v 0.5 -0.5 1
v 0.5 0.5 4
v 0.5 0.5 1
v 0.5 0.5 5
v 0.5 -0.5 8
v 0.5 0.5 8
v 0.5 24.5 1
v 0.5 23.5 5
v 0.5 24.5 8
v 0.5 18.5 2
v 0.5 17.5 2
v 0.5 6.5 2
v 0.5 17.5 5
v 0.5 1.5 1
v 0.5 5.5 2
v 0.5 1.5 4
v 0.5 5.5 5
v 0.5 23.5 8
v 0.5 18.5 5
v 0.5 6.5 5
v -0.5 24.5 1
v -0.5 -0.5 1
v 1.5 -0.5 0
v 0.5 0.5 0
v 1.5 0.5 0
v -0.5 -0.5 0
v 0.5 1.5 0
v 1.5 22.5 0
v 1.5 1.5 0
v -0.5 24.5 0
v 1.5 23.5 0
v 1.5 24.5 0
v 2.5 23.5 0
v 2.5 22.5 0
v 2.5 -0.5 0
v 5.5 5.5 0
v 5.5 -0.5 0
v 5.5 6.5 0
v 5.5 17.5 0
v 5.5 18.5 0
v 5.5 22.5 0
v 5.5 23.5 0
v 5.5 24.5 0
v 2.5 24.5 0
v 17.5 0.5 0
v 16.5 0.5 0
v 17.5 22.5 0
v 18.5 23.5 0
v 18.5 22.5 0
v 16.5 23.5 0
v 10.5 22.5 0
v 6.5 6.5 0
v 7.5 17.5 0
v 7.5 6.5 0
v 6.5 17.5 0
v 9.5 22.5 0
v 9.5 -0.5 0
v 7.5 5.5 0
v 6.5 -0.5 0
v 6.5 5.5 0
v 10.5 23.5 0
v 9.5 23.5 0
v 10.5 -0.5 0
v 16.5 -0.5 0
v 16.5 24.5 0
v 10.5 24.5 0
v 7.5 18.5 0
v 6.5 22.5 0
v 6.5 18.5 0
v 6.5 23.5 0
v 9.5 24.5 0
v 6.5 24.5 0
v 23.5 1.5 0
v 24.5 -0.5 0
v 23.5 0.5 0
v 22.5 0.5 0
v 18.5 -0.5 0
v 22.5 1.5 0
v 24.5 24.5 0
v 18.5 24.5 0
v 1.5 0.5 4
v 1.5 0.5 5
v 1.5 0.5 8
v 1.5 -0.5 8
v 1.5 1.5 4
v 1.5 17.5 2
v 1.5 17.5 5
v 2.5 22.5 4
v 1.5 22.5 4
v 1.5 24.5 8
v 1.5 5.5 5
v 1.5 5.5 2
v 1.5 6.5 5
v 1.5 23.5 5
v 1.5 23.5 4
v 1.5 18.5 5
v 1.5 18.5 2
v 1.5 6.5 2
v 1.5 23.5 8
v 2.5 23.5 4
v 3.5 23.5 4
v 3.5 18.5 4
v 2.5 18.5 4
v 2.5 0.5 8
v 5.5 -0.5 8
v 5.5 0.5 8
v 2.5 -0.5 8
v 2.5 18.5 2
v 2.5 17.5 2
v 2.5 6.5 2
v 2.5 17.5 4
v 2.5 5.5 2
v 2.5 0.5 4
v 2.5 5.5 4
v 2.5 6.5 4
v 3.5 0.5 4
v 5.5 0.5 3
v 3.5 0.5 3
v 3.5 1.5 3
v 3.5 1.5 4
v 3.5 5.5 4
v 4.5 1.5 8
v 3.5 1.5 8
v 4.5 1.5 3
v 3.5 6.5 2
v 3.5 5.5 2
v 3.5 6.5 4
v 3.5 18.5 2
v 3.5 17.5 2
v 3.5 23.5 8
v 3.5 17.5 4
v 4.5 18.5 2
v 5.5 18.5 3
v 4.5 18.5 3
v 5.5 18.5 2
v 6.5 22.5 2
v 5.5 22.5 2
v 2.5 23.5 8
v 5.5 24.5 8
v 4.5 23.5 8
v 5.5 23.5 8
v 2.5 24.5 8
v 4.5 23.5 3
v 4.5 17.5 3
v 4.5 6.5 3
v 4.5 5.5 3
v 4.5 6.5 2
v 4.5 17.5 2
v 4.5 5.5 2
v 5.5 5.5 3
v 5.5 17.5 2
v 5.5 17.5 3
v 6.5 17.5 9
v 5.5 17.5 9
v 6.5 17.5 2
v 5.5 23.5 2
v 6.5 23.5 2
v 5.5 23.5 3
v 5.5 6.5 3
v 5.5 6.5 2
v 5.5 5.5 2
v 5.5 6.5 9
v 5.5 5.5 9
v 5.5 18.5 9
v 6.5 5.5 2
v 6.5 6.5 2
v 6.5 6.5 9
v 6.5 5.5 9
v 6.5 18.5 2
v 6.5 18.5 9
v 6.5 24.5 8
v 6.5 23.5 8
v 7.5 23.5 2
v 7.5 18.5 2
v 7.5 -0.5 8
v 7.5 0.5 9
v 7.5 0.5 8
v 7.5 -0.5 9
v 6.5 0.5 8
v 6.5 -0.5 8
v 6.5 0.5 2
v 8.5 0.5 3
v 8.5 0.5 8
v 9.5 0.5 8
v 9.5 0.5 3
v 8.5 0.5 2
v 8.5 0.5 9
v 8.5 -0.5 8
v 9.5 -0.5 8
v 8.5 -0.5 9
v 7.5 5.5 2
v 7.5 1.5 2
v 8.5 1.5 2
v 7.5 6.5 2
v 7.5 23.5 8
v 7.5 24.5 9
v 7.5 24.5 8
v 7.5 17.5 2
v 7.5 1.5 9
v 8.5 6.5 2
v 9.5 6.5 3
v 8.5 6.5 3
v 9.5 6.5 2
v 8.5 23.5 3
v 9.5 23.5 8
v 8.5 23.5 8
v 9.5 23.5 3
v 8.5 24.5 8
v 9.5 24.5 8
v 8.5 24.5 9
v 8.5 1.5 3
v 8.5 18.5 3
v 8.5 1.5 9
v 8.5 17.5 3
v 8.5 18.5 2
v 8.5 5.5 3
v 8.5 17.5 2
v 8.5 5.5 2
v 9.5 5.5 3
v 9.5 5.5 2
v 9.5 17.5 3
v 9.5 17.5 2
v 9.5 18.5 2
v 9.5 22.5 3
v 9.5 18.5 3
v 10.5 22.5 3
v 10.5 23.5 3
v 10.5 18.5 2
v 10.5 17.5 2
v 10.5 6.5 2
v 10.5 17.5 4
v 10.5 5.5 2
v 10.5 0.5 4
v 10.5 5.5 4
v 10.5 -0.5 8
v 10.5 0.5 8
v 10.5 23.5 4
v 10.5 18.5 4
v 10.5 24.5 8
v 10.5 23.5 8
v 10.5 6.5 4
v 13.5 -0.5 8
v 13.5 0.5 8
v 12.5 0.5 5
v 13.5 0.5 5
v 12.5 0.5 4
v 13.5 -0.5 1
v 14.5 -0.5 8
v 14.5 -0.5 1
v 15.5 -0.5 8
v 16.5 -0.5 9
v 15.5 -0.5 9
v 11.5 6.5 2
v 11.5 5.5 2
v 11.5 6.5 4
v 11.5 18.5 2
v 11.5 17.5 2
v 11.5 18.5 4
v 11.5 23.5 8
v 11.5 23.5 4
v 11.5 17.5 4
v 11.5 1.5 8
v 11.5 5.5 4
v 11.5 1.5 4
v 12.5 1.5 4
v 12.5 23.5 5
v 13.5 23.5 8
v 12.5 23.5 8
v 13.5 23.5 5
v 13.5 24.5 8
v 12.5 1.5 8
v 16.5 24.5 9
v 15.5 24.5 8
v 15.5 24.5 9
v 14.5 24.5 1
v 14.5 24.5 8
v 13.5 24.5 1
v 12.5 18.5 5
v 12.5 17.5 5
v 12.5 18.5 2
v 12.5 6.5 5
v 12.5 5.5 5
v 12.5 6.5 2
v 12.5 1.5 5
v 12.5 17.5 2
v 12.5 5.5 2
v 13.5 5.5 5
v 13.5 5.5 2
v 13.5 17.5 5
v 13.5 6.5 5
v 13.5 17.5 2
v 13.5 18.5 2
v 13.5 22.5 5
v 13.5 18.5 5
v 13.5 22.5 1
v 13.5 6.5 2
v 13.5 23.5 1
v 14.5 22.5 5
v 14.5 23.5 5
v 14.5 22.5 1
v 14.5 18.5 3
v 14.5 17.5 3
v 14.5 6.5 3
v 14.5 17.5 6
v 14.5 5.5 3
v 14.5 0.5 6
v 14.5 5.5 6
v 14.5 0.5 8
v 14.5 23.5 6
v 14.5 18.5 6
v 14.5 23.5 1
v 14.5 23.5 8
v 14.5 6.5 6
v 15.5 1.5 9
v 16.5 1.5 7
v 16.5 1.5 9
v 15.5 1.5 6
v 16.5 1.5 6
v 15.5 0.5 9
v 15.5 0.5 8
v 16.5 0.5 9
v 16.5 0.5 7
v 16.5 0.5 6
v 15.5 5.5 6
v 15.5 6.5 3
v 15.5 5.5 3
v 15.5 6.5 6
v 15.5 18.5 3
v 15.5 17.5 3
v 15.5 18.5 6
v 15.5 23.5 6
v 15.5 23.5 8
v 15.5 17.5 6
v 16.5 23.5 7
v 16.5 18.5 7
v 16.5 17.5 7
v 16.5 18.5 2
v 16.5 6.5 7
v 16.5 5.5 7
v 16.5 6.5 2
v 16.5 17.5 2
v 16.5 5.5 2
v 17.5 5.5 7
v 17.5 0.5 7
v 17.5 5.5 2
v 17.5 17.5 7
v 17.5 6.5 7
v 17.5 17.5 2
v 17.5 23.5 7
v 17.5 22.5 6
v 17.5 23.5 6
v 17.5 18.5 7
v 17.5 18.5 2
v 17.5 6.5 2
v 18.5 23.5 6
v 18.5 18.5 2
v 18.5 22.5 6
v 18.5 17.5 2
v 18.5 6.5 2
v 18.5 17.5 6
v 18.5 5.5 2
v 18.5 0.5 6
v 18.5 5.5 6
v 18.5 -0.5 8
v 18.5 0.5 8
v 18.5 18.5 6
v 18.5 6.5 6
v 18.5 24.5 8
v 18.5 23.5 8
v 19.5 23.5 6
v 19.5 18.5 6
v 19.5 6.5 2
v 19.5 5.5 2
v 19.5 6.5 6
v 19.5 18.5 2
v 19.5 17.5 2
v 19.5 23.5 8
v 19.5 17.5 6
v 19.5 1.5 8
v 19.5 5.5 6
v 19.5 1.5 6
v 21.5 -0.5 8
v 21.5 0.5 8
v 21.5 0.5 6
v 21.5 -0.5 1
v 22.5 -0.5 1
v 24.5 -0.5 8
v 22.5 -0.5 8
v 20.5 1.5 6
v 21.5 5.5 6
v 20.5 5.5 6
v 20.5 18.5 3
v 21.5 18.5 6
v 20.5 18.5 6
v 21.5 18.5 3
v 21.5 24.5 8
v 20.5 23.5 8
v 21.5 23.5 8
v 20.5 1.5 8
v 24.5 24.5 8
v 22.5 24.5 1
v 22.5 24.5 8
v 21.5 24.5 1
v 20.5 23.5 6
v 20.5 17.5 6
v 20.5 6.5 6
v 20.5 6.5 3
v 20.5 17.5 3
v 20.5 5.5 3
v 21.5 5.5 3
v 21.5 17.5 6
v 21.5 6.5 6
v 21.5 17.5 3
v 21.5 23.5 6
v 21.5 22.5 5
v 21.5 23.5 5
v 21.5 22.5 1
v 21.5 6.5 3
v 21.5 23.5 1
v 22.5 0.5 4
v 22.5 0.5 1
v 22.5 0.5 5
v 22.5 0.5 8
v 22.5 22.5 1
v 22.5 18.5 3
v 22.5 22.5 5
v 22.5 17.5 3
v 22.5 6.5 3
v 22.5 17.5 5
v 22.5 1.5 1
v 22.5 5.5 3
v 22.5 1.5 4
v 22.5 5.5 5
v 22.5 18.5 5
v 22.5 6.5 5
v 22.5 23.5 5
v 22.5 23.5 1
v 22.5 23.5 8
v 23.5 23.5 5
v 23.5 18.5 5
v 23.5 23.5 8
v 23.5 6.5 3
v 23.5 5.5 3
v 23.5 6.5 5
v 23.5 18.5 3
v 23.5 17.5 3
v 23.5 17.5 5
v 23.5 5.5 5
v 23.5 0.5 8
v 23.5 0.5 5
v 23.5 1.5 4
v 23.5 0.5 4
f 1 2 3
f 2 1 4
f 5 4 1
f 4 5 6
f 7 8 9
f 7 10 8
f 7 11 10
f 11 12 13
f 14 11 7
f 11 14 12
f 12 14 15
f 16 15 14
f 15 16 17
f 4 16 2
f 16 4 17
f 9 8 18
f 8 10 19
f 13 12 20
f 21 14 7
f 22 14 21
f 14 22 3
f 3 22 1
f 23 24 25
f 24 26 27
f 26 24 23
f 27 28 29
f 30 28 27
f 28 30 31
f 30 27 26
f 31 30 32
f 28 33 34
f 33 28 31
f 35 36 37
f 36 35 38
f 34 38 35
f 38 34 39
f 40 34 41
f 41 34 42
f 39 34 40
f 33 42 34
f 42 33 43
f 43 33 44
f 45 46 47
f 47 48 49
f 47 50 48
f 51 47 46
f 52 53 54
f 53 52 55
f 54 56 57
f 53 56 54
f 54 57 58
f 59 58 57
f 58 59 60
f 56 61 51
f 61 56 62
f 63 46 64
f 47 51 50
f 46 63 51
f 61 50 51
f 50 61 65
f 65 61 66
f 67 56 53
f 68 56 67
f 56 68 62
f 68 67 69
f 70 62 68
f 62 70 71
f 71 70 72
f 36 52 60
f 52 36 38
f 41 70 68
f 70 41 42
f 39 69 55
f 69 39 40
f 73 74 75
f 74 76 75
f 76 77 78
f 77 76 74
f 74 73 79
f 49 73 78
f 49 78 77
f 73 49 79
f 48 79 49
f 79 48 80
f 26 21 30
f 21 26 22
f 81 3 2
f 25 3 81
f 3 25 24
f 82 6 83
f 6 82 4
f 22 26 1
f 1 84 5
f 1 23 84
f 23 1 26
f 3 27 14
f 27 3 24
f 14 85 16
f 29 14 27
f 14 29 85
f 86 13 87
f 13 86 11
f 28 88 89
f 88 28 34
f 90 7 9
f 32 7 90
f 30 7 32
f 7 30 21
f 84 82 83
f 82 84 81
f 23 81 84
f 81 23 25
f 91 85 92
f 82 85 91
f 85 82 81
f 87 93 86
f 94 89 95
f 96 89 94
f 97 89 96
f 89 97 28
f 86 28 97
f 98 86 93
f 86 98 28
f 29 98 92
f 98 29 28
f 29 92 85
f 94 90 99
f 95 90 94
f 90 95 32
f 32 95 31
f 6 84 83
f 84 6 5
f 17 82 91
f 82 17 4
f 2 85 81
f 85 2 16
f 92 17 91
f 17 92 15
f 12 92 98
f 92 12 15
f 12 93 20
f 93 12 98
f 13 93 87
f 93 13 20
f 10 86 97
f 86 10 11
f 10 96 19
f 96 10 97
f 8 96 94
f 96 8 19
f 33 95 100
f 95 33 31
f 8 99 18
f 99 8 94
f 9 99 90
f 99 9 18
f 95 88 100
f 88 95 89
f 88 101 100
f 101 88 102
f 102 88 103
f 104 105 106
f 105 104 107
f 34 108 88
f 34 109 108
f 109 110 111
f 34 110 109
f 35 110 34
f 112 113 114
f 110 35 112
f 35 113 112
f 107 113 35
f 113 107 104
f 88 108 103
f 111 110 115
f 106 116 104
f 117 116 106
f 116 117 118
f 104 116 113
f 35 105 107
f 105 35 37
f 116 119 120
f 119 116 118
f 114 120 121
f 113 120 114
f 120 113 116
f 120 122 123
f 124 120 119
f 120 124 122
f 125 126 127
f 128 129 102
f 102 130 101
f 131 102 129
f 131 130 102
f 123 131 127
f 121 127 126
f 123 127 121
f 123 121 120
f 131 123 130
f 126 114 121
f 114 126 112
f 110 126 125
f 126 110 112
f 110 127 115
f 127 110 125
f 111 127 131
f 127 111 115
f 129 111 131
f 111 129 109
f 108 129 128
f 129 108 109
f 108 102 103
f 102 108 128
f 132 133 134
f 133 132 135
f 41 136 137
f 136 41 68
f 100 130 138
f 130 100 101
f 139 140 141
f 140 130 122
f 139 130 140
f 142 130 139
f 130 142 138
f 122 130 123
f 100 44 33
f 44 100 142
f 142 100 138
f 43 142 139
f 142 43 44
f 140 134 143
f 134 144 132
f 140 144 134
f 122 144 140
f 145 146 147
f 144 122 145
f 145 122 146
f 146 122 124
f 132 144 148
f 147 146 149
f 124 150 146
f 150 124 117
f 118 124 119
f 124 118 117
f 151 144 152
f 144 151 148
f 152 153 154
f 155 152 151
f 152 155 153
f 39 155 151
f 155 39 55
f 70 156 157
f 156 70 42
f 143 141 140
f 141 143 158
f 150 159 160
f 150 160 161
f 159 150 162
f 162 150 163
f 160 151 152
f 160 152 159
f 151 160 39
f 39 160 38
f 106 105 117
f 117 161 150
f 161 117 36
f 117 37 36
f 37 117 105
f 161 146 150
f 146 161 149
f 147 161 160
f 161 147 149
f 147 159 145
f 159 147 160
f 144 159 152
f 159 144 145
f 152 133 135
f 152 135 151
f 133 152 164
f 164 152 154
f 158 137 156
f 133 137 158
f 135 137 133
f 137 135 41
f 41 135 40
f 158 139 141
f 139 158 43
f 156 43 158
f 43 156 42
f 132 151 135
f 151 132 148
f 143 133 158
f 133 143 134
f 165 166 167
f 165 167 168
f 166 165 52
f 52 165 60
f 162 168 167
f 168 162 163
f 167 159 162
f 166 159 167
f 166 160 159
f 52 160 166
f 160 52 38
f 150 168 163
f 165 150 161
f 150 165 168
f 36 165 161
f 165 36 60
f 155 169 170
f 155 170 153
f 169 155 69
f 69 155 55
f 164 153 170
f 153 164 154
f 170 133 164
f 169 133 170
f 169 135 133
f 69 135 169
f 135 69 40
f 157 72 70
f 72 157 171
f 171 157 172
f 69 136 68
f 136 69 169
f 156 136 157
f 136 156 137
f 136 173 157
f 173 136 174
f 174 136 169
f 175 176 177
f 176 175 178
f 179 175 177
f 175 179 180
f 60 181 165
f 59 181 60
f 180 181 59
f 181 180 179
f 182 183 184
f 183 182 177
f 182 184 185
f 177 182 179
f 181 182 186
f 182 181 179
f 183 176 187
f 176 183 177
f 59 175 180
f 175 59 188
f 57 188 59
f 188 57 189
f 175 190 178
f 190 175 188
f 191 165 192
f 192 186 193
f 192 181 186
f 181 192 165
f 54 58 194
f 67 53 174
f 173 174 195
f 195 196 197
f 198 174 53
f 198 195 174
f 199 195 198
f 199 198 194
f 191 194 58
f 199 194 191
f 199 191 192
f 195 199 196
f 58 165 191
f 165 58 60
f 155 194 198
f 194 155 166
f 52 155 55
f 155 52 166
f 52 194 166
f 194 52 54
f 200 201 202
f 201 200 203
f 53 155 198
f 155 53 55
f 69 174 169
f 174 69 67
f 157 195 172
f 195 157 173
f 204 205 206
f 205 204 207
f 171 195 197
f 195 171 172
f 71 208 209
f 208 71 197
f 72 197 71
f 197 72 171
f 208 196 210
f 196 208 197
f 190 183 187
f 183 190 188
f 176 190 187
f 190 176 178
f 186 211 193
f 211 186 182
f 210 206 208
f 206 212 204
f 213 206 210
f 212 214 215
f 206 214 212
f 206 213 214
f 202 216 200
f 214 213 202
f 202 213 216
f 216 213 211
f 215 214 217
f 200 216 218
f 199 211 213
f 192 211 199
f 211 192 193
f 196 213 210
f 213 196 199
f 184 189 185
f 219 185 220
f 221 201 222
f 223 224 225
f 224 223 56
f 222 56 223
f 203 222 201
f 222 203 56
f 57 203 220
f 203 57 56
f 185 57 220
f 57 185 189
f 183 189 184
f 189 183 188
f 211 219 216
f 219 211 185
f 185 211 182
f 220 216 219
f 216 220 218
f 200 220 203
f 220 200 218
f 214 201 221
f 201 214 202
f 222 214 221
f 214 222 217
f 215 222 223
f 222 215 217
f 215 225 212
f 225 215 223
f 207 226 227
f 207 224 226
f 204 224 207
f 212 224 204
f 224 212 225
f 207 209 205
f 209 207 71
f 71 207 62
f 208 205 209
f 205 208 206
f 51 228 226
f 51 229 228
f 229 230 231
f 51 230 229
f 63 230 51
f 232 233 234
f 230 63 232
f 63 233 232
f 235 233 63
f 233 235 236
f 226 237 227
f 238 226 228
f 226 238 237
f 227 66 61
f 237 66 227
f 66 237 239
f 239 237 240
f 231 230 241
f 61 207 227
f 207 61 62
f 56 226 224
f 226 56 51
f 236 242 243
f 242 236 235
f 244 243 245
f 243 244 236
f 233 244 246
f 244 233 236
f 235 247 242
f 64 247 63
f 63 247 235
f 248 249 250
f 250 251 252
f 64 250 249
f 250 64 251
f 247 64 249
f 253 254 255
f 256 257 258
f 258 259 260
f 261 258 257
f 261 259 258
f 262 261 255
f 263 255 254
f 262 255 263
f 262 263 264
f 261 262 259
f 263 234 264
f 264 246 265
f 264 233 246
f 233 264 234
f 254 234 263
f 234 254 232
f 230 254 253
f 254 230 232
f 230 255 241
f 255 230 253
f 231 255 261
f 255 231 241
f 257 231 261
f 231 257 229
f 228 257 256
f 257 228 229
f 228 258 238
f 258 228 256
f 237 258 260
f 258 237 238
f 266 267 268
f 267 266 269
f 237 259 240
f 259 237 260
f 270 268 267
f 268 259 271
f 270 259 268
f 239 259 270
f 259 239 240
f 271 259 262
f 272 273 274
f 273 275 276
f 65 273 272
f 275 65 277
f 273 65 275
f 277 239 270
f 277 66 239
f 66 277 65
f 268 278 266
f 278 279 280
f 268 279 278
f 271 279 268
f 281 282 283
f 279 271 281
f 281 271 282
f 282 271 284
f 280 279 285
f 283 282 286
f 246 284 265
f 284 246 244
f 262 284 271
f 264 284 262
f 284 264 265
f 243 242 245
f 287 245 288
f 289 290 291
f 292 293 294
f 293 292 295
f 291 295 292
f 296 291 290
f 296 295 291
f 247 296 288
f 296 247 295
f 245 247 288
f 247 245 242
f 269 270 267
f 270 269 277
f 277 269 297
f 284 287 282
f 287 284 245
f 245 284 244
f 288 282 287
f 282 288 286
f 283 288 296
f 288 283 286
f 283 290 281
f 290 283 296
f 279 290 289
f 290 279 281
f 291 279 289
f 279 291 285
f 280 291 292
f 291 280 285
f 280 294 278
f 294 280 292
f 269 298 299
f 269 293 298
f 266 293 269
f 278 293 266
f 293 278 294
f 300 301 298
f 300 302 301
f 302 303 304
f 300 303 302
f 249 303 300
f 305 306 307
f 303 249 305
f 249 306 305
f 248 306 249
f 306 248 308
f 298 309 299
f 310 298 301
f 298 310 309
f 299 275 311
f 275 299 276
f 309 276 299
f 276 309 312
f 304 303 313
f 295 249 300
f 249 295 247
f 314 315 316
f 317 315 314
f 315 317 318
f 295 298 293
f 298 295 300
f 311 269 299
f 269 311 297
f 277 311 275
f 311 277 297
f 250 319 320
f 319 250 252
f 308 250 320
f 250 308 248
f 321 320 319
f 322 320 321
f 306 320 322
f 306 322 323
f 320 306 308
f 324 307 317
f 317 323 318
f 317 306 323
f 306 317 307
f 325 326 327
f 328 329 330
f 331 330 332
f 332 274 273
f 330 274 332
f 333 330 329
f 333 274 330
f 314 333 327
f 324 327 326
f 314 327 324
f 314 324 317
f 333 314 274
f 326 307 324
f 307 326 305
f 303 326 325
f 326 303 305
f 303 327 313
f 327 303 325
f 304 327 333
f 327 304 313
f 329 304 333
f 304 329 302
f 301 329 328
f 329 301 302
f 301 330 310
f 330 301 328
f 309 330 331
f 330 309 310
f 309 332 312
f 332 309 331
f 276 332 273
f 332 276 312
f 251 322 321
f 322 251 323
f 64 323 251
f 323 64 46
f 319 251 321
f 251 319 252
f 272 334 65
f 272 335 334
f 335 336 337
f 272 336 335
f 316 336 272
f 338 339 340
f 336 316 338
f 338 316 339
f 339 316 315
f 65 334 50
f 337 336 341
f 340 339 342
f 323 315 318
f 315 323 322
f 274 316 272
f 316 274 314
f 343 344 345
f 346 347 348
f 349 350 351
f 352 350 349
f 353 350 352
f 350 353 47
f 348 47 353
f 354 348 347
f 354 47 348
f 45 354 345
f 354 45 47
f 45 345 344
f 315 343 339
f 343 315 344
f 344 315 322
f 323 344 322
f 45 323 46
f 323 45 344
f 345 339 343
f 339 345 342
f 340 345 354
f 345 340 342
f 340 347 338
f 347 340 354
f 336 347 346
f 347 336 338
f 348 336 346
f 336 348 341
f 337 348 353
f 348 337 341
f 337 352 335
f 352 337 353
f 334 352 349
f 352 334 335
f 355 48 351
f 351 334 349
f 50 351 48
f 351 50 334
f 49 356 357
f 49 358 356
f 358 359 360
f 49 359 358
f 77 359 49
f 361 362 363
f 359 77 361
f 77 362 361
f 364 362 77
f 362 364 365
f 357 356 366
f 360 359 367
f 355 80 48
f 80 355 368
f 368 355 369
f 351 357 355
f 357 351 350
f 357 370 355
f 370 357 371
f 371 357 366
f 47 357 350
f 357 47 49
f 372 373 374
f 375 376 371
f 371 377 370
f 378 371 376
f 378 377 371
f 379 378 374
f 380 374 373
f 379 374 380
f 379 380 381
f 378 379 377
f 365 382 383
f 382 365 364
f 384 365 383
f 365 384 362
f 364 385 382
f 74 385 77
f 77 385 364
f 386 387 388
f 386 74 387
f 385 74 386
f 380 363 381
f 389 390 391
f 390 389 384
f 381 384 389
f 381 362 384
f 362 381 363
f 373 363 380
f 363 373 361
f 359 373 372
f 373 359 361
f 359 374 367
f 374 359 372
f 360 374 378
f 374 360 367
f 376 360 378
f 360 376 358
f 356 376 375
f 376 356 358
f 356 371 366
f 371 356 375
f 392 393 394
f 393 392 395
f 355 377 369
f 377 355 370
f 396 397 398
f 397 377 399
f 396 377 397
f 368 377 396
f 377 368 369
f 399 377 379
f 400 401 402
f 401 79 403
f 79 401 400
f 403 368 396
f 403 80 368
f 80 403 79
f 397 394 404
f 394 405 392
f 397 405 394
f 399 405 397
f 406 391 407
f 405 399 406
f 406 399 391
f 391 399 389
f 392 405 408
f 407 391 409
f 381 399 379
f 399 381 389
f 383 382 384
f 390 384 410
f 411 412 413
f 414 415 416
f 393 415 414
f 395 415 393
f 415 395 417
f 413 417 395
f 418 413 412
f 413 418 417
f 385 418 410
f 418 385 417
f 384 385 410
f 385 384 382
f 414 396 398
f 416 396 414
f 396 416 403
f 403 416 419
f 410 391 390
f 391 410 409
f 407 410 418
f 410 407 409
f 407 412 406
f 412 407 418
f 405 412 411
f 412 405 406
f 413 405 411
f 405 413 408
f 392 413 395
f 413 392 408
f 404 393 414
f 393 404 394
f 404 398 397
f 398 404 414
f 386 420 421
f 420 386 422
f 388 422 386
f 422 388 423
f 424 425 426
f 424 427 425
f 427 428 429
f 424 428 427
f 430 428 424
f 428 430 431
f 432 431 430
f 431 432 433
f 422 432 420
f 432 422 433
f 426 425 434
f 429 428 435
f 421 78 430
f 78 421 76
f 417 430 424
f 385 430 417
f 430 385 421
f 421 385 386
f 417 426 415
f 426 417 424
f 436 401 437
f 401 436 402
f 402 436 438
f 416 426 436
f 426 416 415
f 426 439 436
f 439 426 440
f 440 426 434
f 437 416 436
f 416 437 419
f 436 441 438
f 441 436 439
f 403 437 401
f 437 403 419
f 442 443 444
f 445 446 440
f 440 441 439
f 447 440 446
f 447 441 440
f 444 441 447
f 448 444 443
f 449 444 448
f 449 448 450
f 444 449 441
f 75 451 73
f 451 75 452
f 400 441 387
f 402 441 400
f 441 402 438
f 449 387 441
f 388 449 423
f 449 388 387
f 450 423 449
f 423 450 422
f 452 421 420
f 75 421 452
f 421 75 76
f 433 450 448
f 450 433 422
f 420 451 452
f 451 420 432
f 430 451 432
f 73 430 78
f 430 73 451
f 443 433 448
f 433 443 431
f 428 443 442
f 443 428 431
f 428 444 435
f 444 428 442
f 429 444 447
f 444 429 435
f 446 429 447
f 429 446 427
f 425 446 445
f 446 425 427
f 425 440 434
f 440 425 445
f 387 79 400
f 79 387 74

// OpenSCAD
union() {
    translate([0, 0, 0.5]) cube([1, 1, 1], center=true);
    translate([0, 1, 0.5]) cube([1, 1, 1], center=true);
    translate([0, 2, 0.5]) cube([1, 1, 1], center=true);
    translate([0, 3, 0.5]) cube([1, 1, 1], center=true);
    translate([0, 4, 0.5]) cube([1, 1, 1], center=true);
    translate([0, 5, 0.5]) cube([1, 1, 1], center=true);
    translate([0, 6, 0.5]) cube([1, 1, 1], center=true);
    translate([0, 7, 0.5]) cube([1, 1, 1], center=true);
    translate([0, 8, 0.5]) cube([1, 1, 1], center=true);
    translate([0, 9, 0.5]) cube([1, 1, 1], center=true);
    translate([0, 10, 0.5]) cube([1, 1, 1], center=true);
    translate([0, 11, 0.5]) cube([1, 1, 1], center=true);
    translate([0, 12, 0.5]) cube([1, 1, 1], center=true);
    translate([0, 13, 0.5]) cube([1, 1, 1], center=true);
    translate([0, 14, 0.5]) cube([1, 1, 1], center=true);
    translate([0, 15, 0.5]) cube([1, 1, 1], center=true);
    translate([0, 16, 0.5]) cube([1, 1, 1], center=true);
    translate([0, 17, 0.5]) cube([1, 1, 1], center=true);
    translate([0, 18, 0.5]) cube([1, 1, 1], center=true);
    translate([0, 19, 0.5]) cube([1, 1, 1], center=true);
    translate([0, 20, 0.5]) cube([1, 1, 1], center=true);
    translate([0, 21, 0.5]) cube([1, 1, 1], center=true);
    translate([0, 22, 0.5]) cube([1, 1, 1], center=true);
    translate([0, 23, 0.5]) cube([1, 1, 1], center=true);
    translate([0, 24, 0.5]) cube([1, 1, 1], center=true);
    translate([1, 0, 4.0]) cube([1, 1, 8], center=true);
    translate([1, 1, 4.5]) color([1, 0, 0]) cube([1, 1, 1], center=true);
    translate([1, 2, 2.5]) cube([1, 1, 5], center=true);
    translate([1, 3, 2.5]) cube([1, 1, 5], center=true);
    translate([1, 4, 2.5]) cube([1, 1, 5], center=true);
    translate([1, 5, 2.5]) cube([1, 1, 5], center=true);
    translate([1, 6, 1.0]) cube([1, 1, 2], center=true);
    translate([1, 7, 2.5]) cube([1, 1, 5], center=true);
    translate([1, 8, 2.5]) cube([1, 1, 5], center=true);
    translate([1, 9, 2.5]) cube([1, 1, 5], center=true);
    translate([1, 10, 2.5]) cube([1, 1, 5], center=true);
    translate([1, 11, 2.5]) cube([1, 1, 5], center=true);
    translate([1, 12, 2.5]) cube([1, 1, 5], center=true);
    translate([1, 13, 2.5]) cube([1, 1, 5], center=true);
    translate([1, 14, 2.5]) cube([1, 1, 5], center=true);
    translate([1, 15, 2.5]) cube([1, 1, 5], center=true);
    translate([1, 16, 2.5]) cube([1, 1, 5], center=true);
    translate([1, 17, 2.5]) cube([1, 1, 5], center=true);
    translate([1, 18, 1.0]) cube([1, 1, 2], center=true);
    translate([1, 19, 2.5]) cube([1, 1, 5], center=true);
    translate([1, 20, 2.5]) cube([1, 1, 5], center=true);
    translate([1, 21, 2.5]) cube([1, 1, 5], center=true);
    translate([1, 22, 2.5]) cube([1, 1, 5], center=true);
    translate([1, 23, 2.5]) cube([1, 1, 5], center=true);
    translate([1, 24, 4.0]) cube([1, 1, 8], center=true);
    translate([2, 23, 2.0]) cube([1, 1, 4], center=true);
    translate([3, 0, 4.0]) cube([1, 1, 8], center=true);
    translate([3, 1, 2.0]) cube([1, 1, 4], center=true);
    translate([3, 2, 2.0]) cube([1, 1, 4], center=true);
    translate([3, 3, 2.0]) cube([1, 1, 4], center=true);
    translate([3, 4, 2.0]) cube([1, 1, 4], center=true);
    translate([3, 5, 2.0]) cube([1, 1, 4], center=true);
    translate([3, 6, 1.0]) cube([1, 1, 2], center=true);
    translate([3, 7, 2.0]) cube([1, 1, 4], center=true);
    translate([3, 8, 2.0]) cube([1, 1, 4], center=true);
    translate([3, 9, 2.0]) cube([1, 1, 4], center=true);
    translate([3, 10, 2.0]) cube([1, 1, 4], center=true);
    translate([3, 11, 2.0]) cube([1, 1, 4], center=true);
    translate([3, 12, 2.0]) cube([1, 1, 4], center=true);
    translate([3, 13, 2.0]) cube([1, 1, 4], center=true);
    translate([3, 14, 2.0]) cube([1, 1, 4], center=true);
    translate([3, 15, 2.0]) cube([1, 1, 4], center=true);
    translate([3, 16, 2.0]) cube([1, 1, 4], center=true);
    translate([3, 17, 2.0]) cube([1, 1, 4], center=true);
    translate([3, 18, 1.0]) cube([1, 1, 2], center=true);
    translate([3, 19, 2.0]) cube([1, 1, 4], center=true);
    translate([3, 20, 2.0]) cube([1, 1, 4], center=true);
    translate([3, 21, 2.0]) cube([1, 1, 4], center=true);
    translate([3, 22, 2.0]) cube([1, 1, 4], center=true);
    translate([3, 23, 2.0]) cube([1, 1, 4], center=true);
    translate([3, 24, 4.0]) cube([1, 1, 8], center=true);
    translate([4, 0, 4.0]) cube([1, 1, 8], center=true);
    translate([4, 1, 1.5]) cube([1, 1, 3], center=true);
    translate([4, 2, 4.0]) cube([1, 1, 8], center=true);
    translate([4, 3, 4.0]) cube([1, 1, 8], center=true);
    translate([4, 4, 4.0]) cube([1, 1, 8], center=true);
    translate([4, 5, 4.0]) cube([1, 1, 8], center=true);
    translate([4, 6, 4.0]) cube([1, 1, 8], center=true);
    translate([4, 7, 4.0]) cube([1, 1, 8], center=true);
    translate([4, 8, 4.0]) cube([1, 1, 8], center=true);
    translate([4, 9, 4.0]) cube([1, 1, 8], center=true);
    translate([4, 10, 4.0]) cube([1, 1, 8], center=true);
    translate([4, 11, 4.0]) cube([1, 1, 8], center=true);
    translate([4, 12, 4.0]) cube([1, 1, 8], center=true);
    translate([4, 13, 4.0]) cube([1, 1, 8], center=true);
    translate([4, 14, 4.0]) cube([1, 1, 8], center=true);
    translate([4, 15, 4.0]) cube([1, 1, 8], center=true);
    translate([4, 16, 4.0]) cube([1, 1, 8], center=true);
    translate([4, 17, 4.0]) cube([1, 1, 8], center=true);
    translate([4, 18, 4.0]) cube([1, 1, 8], center=true);
    translate([4, 19, 4.0]) cube([1, 1, 8], center=true);
    translate([4, 20, 4.0]) cube([1, 1, 8], center=true);
    translate([4, 21, 4.0]) cube([1, 1, 8], center=true);
    translate([4, 22, 4.0]) cube([1, 1, 8], center=true);
    translate([4, 23, 4.0]) cube([1, 1, 8], center=true);
    translate([4, 24, 4.0]) cube([1, 1, 8], center=true);
    translate([5, 0, 4.0]) cube([1, 1, 8], center=true);
    translate([5, 1, 1.5]) cube([1, 1, 3], center=true);
    translate([5, 2, 1.5]) cube([1, 1, 3], center=true);
    translate([5, 3, 1.5]) cube([1, 1, 3], center=true);
    translate([5, 4, 1.5]) cube([1, 1, 3], center=true);
    translate([5, 5, 1.5]) cube([1, 1, 3], center=true);
    translate([5, 6, 1.0]) cube([1, 1, 2], center=true);
    translate([5, 7, 1.5]) cube([1, 1, 3], center=true);
    translate([5, 8, 1.5]) cube([1, 1, 3], center=true);
    translate([5, 9, 1.5]) cube([1, 1, 3], center=true);
    translate([5, 10, 1.5]) cube([1, 1, 3], center=true);
    translate([5, 11, 1.5]) cube([1, 1, 3], center=true);
    translate([5, 12, 1.5]) cube([1, 1, 3], center=true);
    translate([5, 13, 1.5]) cube([1, 1, 3], center=true);
    translate([5, 14, 1.5]) cube([1, 1, 3], center=true);
    translate([5, 15, 1.5]) cube([1, 1, 3], center=true);
    translate([5, 16, 1.5]) cube([1, 1, 3], center=true);
    translate([5, 17, 1.5]) cube([1, 1, 3], center=true);
    translate([5, 18, 1.0]) cube([1, 1, 2], center=true);
    translate([5, 19, 1.5]) cube([1, 1, 3], center=true);
    translate([5, 20, 1.5]) cube([1, 1, 3], center=true);
    translate([5, 21, 1.5]) cube([1, 1, 3], center=true);
    translate([5, 22, 1.5]) cube([1, 1, 3], center=true);
    translate([5, 23, 1.5]) cube([1, 1, 3], center=true);
    translate([5, 24, 4.0]) cube([1, 1, 8], center=true);
    translate([6, 6, 4.5]) cube([1, 1, 9], center=true);
    translate([6, 18, 4.5]) cube([1, 1, 9], center=true);
    translate([6, 23, 1.0]) cube([1, 1, 2], center=true);
    translate([7, 0, 4.0]) cube([1, 1, 8], center=true);
    translate([7, 1, 1.0]) cube([1, 1, 2], center=true);
    translate([7, 2, 1.0]) cube([1, 1, 2], center=true);
    translate([7, 3, 1.0]) cube([1, 1, 2], center=true);
    translate([7, 4, 1.0]) cube([1, 1, 2], center=true);
    translate([7, 5, 1.0]) cube([1, 1, 2], center=true);
    translate([7, 7, 1.0]) cube([1, 1, 2], center=true);
    translate([7, 8, 1.0]) cube([1, 1, 2], center=true);
    translate([7, 9, 1.0]) cube([1, 1, 2], center=true);
    translate([7, 10, 1.0]) cube([1, 1, 2], center=true);
    translate([7, 11, 1.0]) cube([1, 1, 2], center=true);
    translate([7, 12, 1.0]) cube([1, 1, 2], center=true);
    translate([7, 13, 1.0]) cube([1, 1, 2], center=true);
    translate([7, 14, 1.0]) cube([1, 1, 2], center=true);
    translate([7, 15, 1.0]) cube([1, 1, 2], center=true);
    translate([7, 16, 1.0]) cube([1, 1, 2], center=true);
    translate([7, 17, 1.0]) cube([1, 1, 2], center=true);
    translate([7, 19, 1.0]) cube([1, 1, 2], center=true);
    translate([7, 20, 1.0]) cube([1, 1, 2], center=true);
    translate([7, 21, 1.0]) cube([1, 1, 2], center=true);
    translate([7, 22, 1.0]) cube([1, 1, 2], center=true);
    translate([7, 23, 1.0]) cube([1, 1, 2], center=true);
    translate([7, 24, 4.0]) cube([1, 1, 8], center=true);
    translate([8, 0, 4.5]) cube([1, 1, 9], center=true);
    translate([8, 1, 1.0]) cube([1, 1, 2], center=true);
    translate([8, 2, 4.5]) cube([1, 1, 9], center=true);
    translate([8, 3, 4.5]) cube([1, 1, 9], center=true);
    translate([8, 4, 4.5]) cube([1, 1, 9], center=true);
    translate([8, 5, 4.5]) cube([1, 1, 9], center=true);
    translate([8, 6, 4.5]) cube([1, 1, 9], center=true);
    translate([8, 7, 4.5]) cube([1, 1, 9], center=true);
    translate([8, 8, 4.5]) cube([1, 1, 9], center=true);
    translate([8, 9, 4.5]) cube([1, 1, 9], center=true);
    translate([8, 10, 4.5]) cube([1, 1, 9], center=true);
    translate([8, 11, 4.5]) cube([1, 1, 9], center=true);
    translate([8, 12, 4.5]) cube([1, 1, 9], center=true);
    translate([8, 13, 4.5]) cube([1, 1, 9], center=true);
    translate([8, 14, 4.5]) cube([1, 1, 9], center=true);
    translate([8, 15, 4.5]) cube([1, 1, 9], center=true);
    translate([8, 16, 4.5]) cube([1, 1, 9], center=true);
    translate([8, 17, 4.5]) cube([1, 1, 9], center=true);
    translate([8, 18, 4.5]) cube([1, 1, 9], center=true);
    translate([8, 19, 4.5]) cube([1, 1, 9], center=true);
    translate([8, 20, 4.5]) cube([1, 1, 9], center=true);
    translate([8, 21, 4.5]) cube([1, 1, 9], center=true);
    translate([8, 22, 4.5]) cube([1, 1, 9], center=true);
    translate([8, 23, 4.5]) cube([1, 1, 9], center=true);
    translate([8, 24, 4.5]) cube([1, 1, 9], center=true);
    translate([9, 0, 4.0]) cube([1, 1, 8], center=true);
    translate([9, 1, 1.5]) cube([1, 1, 3], center=true);
    translate([9, 2, 1.5]) cube([1, 1, 3], center=true);
    translate([9, 3, 1.5]) cube([1, 1, 3], center=true);
    translate([9, 4, 1.5]) cube([1, 1, 3], center=true);
    translate([9, 5, 1.5]) cube([1, 1, 3], center=true);
    translate([9, 6, 1.0]) cube([1, 1, 2], center=true);
    translate([9, 7, 1.5]) cube([1, 1, 3], center=true);
    translate([9, 8, 1.5]) cube([1, 1, 3], center=true);
    translate([9, 9, 1.5]) cube([1, 1, 3], center=true);
    translate([9, 10, 1.5]) cube([1, 1, 3], center=true);
    translate([9, 11, 1.5]) cube([1, 1, 3], center=true);
    translate([9, 12, 1.5]) cube([1, 1, 3], center=true);
    translate([9, 13, 1.5]) cube([1, 1, 3], center=true);
    translate([9, 14, 1.5]) cube([1, 1, 3], center=true);
    translate([9, 15, 1.5]) cube([1, 1, 3], center=true);
    translate([9, 16, 1.5]) cube([1, 1, 3], center=true);
    translate([9, 17, 1.5]) cube([1, 1, 3], center=true);
    translate([9, 18, 1.0]) cube([1, 1, 2], center=true);
    translate([9, 19, 1.5]) cube([1, 1, 3], center=true);
    translate([9, 20, 1.5]) cube([1, 1, 3], center=true);
    translate([9, 21, 1.5]) cube([1, 1, 3], center=true);
    translate([9, 22, 1.5]) cube([1, 1, 3], center=true);
    translate([9, 23, 1.5]) cube([1, 1, 3], center=true);
    translate([9, 24, 4.0]) cube([1, 1, 8], center=true);
    translate([10, 23, 1.5]) cube([1, 1, 3], center=true);
    translate([11, 0, 4.0]) cube([1, 1, 8], center=true);
    translate([11, 1, 2.0]) cube([1, 1, 4], center=true);
    translate([11, 2, 2.0]) cube([1, 1, 4], center=true);
    translate([11, 3, 2.0]) cube([1, 1, 4], center=true);
    translate([11, 4, 2.0]) cube([1, 1, 4], center=true);
    translate([11, 5, 2.0]) cube([1, 1, 4], center=true);
    translate([11, 6, 1.0]) cube([1, 1, 2], center=true);
    translate([11, 7, 2.0]) cube([1, 1, 4], center=true);
    translate([11, 8, 2.0]) cube([1, 1, 4], center=true);
    translate([11, 9, 2.0]) cube([1, 1, 4], center=true);
    translate([11, 10, 2.0]) cube([1, 1, 4], center=true);
    translate([11, 11, 2.0]) cube([1, 1, 4], center=true);
    translate([11, 12, 2.0]) cube([1, 1, 4], center=true);
    translate([11, 13, 2.0]) cube([1, 1, 4], center=true);
    translate([11, 14, 2.0]) cube([1, 1, 4], center=true);
    translate([11, 15, 2.0]) cube([1, 1, 4], center=true);
    translate([11, 16, 2.0]) cube([1, 1, 4], center=true);
    translate([11, 17, 2.0]) cube([1, 1, 4], center=true);
    translate([11, 18, 1.0]) cube([1, 1, 2], center=true);
    translate([11, 19, 2.0]) cube([1, 1, 4], center=true);
    translate([11, 20, 2.0]) cube([1, 1, 4], center=true);
    translate([11, 21, 2.0]) cube([1, 1, 4], center=true);
    translate([11, 22, 2.0]) cube([1, 1, 4], center=true);
    translate([11, 23, 2.0]) cube([1, 1, 4], center=true);
    translate([11, 24, 4.0]) cube([1, 1, 8], center=true);
    translate([12, 0, 4.0]) cube([1, 1, 8], center=true);
    translate([12, 1, 2.0]) cube([1, 1, 4], center=true);
    translate([12, 2, 4.0]) cube([1, 1, 8], center=true);
    translate([12, 3, 4.0]) cube([1, 1, 8], center=true);
    translate([12, 4, 4.0]) cube([1, 1, 8], center=true);
    translate([12, 5, 4.0]) cube([1, 1, 8], center=true);
    translate([12, 6, 4.0]) cube([1, 1, 8], center=true);
    translate([12, 7, 4.0]) cube([1, 1, 8], center=true);
    translate([12, 8, 4.0]) cube([1, 1, 8], center=true);
    translate([12, 9, 4.0]) cube([1, 1, 8], center=true);
    translate([12, 10, 4.0]) cube([1, 1, 8], center=true);
    translate([12, 11, 4.0]) cube([1, 1, 8], center=true);
    translate([12, 12, 4.0]) cube([1, 1, 8], center=true);
    translate([12, 13, 4.0]) cube([1, 1, 8], center=true);
    translate([12, 14, 4.0]) cube([1, 1, 8], center=true);
    translate([12, 15, 4.0]) cube([1, 1, 8], center=true);
    translate([12, 16, 4.0]) cube([1, 1, 8], center=true);
    translate([12, 17, 4.0]) cube([1, 1, 8], center=true);
    translate([12, 18, 4.0]) cube([1, 1, 8], center=true);
    translate([12, 19, 4.0]) cube([1, 1, 8], center=true);
    translate([12, 20, 4.0]) cube([1, 1, 8], center=true);
    translate([12, 21, 4.0]) cube([1, 1, 8], center=true);
    translate([12, 22, 4.0]) cube([1, 1, 8], center=true);
    translate([12, 23, 4.0]) cube([1, 1, 8], center=true);
    translate([12, 24, 4.0]) cube([1, 1, 8], center=true);
    translate([13, 0, 4.0]) cube([1, 1, 8], center=true);
    translate([13, 1, 2.5]) cube([1, 1, 5], center=true);
    translate([13, 2, 2.5]) cube([1, 1, 5], center=true);
    translate([13, 3, 2.5]) cube([1, 1, 5], center=true);
    translate([13, 4, 2.5]) cube([1, 1, 5], center=true);
    translate([13, 5, 2.5]) cube([1, 1, 5], center=true);
    translate([13, 6, 1.0]) cube([1, 1, 2], center=true);
    translate([13, 7, 2.5]) cube([1, 1, 5], center=true);
    translate([13, 8, 2.5]) cube([1, 1, 5], center=true);
    translate([13, 9, 2.5]) cube([1, 1, 5], center=true);
    translate([13, 10, 2.5]) cube([1, 1, 5], center=true);
    translate([13, 11, 2.5]) cube([1, 1, 5], center=true);
    translate([13, 12, 2.5]) cube([1, 1, 5], center=true);
    translate([13, 13, 2.5]) cube([1, 1, 5], center=true);
    translate([13, 14, 2.5]) cube([1, 1, 5], center=true);
    translate([13, 15, 2.5]) cube([1, 1, 5], center=true);
    translate([13, 16, 2.5]) cube([1, 1, 5], center=true);
    translate([13, 17, 2.5]) cube([1, 1, 5], center=true);
    translate([13, 18, 1.0]) cube([1, 1, 2], center=true);
    translate([13, 19, 2.5]) cube([1, 1, 5], center=true);
    translate([13, 20, 2.5]) cube([1, 1, 5], center=true);
    translate([13, 21, 2.5]) cube([1, 1, 5], center=true);
    translate([13, 22, 2.5]) cube([1, 1, 5], center=true);
    translate([13, 23, 2.5]) cube([1, 1, 5], center=true);
    translate([13, 24, 4.0]) cube([1, 1, 8], center=true);
    translate([14, 0, 0.5]) cube([1, 1, 1], center=true);
    translate([14, 1, 0.5]) cube([1, 1, 1], center=true);
    translate([14, 2, 0.5]) cube([1, 1, 1], center=true);
    translate([14, 3, 0.5]) cube([1, 1, 1], center=true);
    translate([14, 4, 0.5]) cube([1, 1, 1], center=true);
    translate([14, 5, 0.5]) cube([1, 1, 1], center=true);
    translate([14, 6, 0.5]) cube([1, 1, 1], center=true);
    translate([14, 7, 0.5]) cube([1, 1, 1], center=true);
    translate([14, 8, 0.5]) cube([1, 1, 1], center=true);
    translate([14, 9, 0.5]) cube([1, 1, 1], center=true);
    translate([14, 10, 0.5]) cube([1, 1, 1], center=true);
    translate([14, 11, 0.5]) cube([1, 1, 1], center=true);
    translate([14, 12, 0.5]) cube([1, 1, 1], center=true);
    translate([14, 13, 0.5]) cube([1, 1, 1], center=true);
    translate([14, 14, 0.5]) cube([1, 1, 1], center=true);
    translate([14, 15, 0.5]) cube([1, 1, 1], center=true);
    translate([14, 16, 0.5]) cube([1, 1, 1], center=true);
    translate([14, 17, 0.5]) cube([1, 1, 1], center=true);
    translate([14, 18, 0.5]) cube([1, 1, 1], center=true);
    translate([14, 19, 0.5]) cube([1, 1, 1], center=true);
    translate([14, 20, 0.5]) cube([1, 1, 1], center=true);
    translate([14, 21, 0.5]) cube([1, 1, 1], center=true);
    translate([14, 22, 0.5]) cube([1, 1, 1], center=true);
    translate([14, 23, 2.5]) cube([1, 1, 5], center=true);
    translate([14, 24, 0.5]) cube([1, 1, 1], center=true);
    translate([15, 0, 4.0]) cube([1, 1, 8], center=true);
    translate([15, 1, 3.0]) cube([1, 1, 6], center=true);
    translate([15, 2, 3.0]) cube([1, 1, 6], center=true);
    translate([15, 3, 3.0]) cube([1, 1, 6], center=true);
    translate([15, 4, 3.0]) cube([1, 1, 6], center=true);
    translate([15, 5, 3.0]) cube([1, 1, 6], center=true);
    translate([15, 6, 1.5]) cube([1, 1, 3], center=true);
    translate([15, 7, 3.0]) cube([1, 1, 6], center=true);
    translate([15, 8, 3.0]) cube([1, 1, 6], center=true);
    translate([15, 9, 3.0]) cube([1, 1, 6], center=true);
    translate([15, 10, 3.0]) cube([1, 1, 6], center=true);
    translate([15, 11, 3.0]) cube([1, 1, 6], center=true);
    translate([15, 12, 3.0]) cube([1, 1, 6], center=true);
    translate([15, 13, 3.0]) cube([1, 1, 6], center=true);
    translate([15, 14, 3.0]) cube([1, 1, 6], center=true);
    translate([15, 15, 3.0]) cube([1, 1, 6], center=true);
    translate([15, 16, 3.0]) cube([1, 1, 6], center=true);
    translate([15, 17, 3.0]) cube([1, 1, 6], center=true);
    translate([15, 18, 1.5]) cube([1, 1, 3], center=true);
    translate([15, 19, 3.0]) cube([1, 1, 6], center=true);
    translate([15, 20, 3.0]) cube([1, 1, 6], center=true);
    translate([15, 21, 3.0]) cube([1, 1, 6], center=true);
    translate([15, 22, 3.0]) cube([1, 1, 6], center=true);
    translate([15, 23, 3.0]) cube([1, 1, 6], center=true);
    translate([15, 24, 4.0]) cube([1, 1, 8], center=true);
    translate([16, 0, 4.5]) cube([1, 1, 9], center=true);
    translate([16, 1, 3.0]) cube([1, 1, 6], center=true);
    translate([16, 2, 4.5]) cube([1, 1, 9], center=true);
    translate([16, 3, 4.5]) cube([1, 1, 9], center=true);
    translate([16, 4, 4.5]) cube([1, 1, 9], center=true);
    translate([16, 5, 4.5]) cube([1, 1, 9], center=true);
    translate([16, 6, 4.5]) cube([1, 1, 9], center=true);
    translate([16, 7, 4.5]) cube([1, 1, 9], center=true);
    translate([16, 8, 4.5]) cube([1, 1, 9], center=true);
    translate([16, 9, 4.5]) cube([1, 1, 9], center=true);
    translate([16, 10, 4.5]) cube([1, 1, 9], center=true);
    translate([16, 11, 4.5]) cube([1, 1, 9], center=true);
    translate([16, 12, 4.5]) cube([1, 1, 9], center=true);
    translate([16, 13, 4.5]) cube([1, 1, 9], center=true);
    translate([16, 14, 4.5]) cube([1, 1, 9], center=true);
    translate([16, 15, 4.5]) cube([1, 1, 9], center=true);
    translate([16, 16, 4.5]) cube([1, 1, 9], center=true);
    translate([16, 17, 4.5]) cube([1, 1, 9], center=true);
    translate([16, 18, 4.5]) cube([1, 1, 9], center=true);
    translate([16, 19, 4.5]) cube([1, 1, 9], center=true);
    translate([16, 20, 4.5]) cube([1, 1, 9], center=true);
    translate([16, 21, 4.5]) cube([1, 1, 9], center=true);
    translate([16, 22, 4.5]) cube([1, 1, 9], center=true);
    translate([16, 23, 4.5]) cube([1, 1, 9], center=true);
    translate([16, 24, 4.5]) cube([1, 1, 9], center=true);
    translate([17, 1, 3.5]) cube([1, 1, 7], center=true);
    translate([17, 2, 3.5]) cube([1, 1, 7], center=true);
    translate([17, 3, 3.5]) cube([1, 1, 7], center=true);
    translate([17, 4, 3.5]) cube([1, 1, 7], center=true);
    translate([17, 5, 3.5]) cube([1, 1, 7], center=true);
    translate([17, 6, 1.0]) cube([1, 1, 2], center=true);
    translate([17, 7, 3.5]) cube([1, 1, 7], center=true);
    translate([17, 8, 3.5]) cube([1, 1, 7], center=true);
    translate([17, 9, 3.5]) cube([1, 1, 7], center=true);
    translate([17, 10, 3.5]) cube([1, 1, 7], center=true);
    translate([17, 11, 3.5]) cube([1, 1, 7], center=true);
    translate([17, 12, 3.5]) cube([1, 1, 7], center=true);
    translate([17, 13, 3.5]) cube([1, 1, 7], center=true);
    translate([17, 14, 3.5]) cube([1, 1, 7], center=true);
    translate([17, 15, 3.5]) cube([1, 1, 7], center=true);
    translate([17, 16, 3.5]) cube([1, 1, 7], center=true);
    translate([17, 17, 3.5]) cube([1, 1, 7], center=true);
    translate([17, 18, 1.0]) cube([1, 1, 2], center=true);
    translate([17, 19, 3.5]) cube([1, 1, 7], center=true);
    translate([17, 20, 3.5]) cube([1, 1, 7], center=true);
    translate([17, 21, 3.5]) cube([1, 1, 7], center=true);
    translate([17, 22, 3.5]) cube([1, 1, 7], center=true);
    translate([17, 23, 3.5]) cube([1, 1, 7], center=true);
    translate([18, 23, 3.0]) cube([1, 1, 6], center=true);
    translate([19, 0, 4.0]) cube([1, 1, 8], center=true);
    translate([19, 1, 3.0]) cube([1, 1, 6], center=true);
    translate([19, 2, 3.0]) cube([1, 1, 6], center=true);
    translate([19, 3, 3.0]) cube([1, 1, 6], center=true);
    translate([19, 4, 3.0]) cube([1, 1, 6], center=true);
    translate([19, 5, 3.0]) cube([1, 1, 6], center=true);
    translate([19, 6, 1.0]) cube([1, 1, 2], center=true);
    translate([19, 7, 3.0]) cube([1, 1, 6], center=true);
    translate([19, 8, 3.0]) cube([1, 1, 6], center=true);
    translate([19, 9, 3.0]) cube([1, 1, 6], center=true);
    translate([19, 10, 3.0]) cube([1, 1, 6], center=true);
    translate([19, 11, 3.0]) cube([1, 1, 6], center=true);
    translate([19, 12, 3.0]) cube([1, 1, 6], center=true);
    translate([19, 13, 3.0]) cube([1, 1, 6], center=true);
    translate([19, 14, 3.0]) cube([1, 1, 6], center=true);
    translate([19, 15, 3.0]) cube([1, 1, 6], center=true);
    translate([19, 16, 3.0]) cube([1, 1, 6], center=true);
    translate([19, 17, 3.0]) cube([1, 1, 6], center=true);
    translate([19, 18, 1.0]) cube([1, 1, 2], center=true);
    translate([19, 19, 3.0]) cube([1, 1, 6], center=true);
    translate([19, 20, 3.0]) cube([1, 1, 6], center=true);
    translate([19, 21, 3.0]) cube([1, 1, 6], center=true);
    translate([19, 22, 3.0]) cube([1, 1, 6], center=true);
    translate([19, 23, 3.0]) cube([1, 1, 6], center=true);
    translate([19, 24, 4.0]) cube([1, 1, 8], center=true);
    translate([20, 0, 4.0]) cube([1, 1, 8], center=true);
    translate([20, 1, 3.0]) cube([1, 1, 6], center=true);
    translate([20, 2, 4.0]) cube([1, 1, 8], center=true);
    translate([20, 3, 4.0]) cube([1, 1, 8], center=true);
    translate([20, 4, 4.0]) cube([1, 1, 8], center=true);
    translate([20, 5, 4.0]) cube([1, 1, 8], center=true);
    translate([20, 6, 4.0]) cube([1, 1, 8], center=true);
    translate([20, 7, 4.0]) cube([1, 1, 8], center=true);
    translate([20, 8, 4.0]) cube([1, 1, 8], center=true);
    translate([20, 9, 4.0]) cube([1, 1, 8], center=true);
    translate([20, 10, 4.0]) cube([1, 1, 8], center=true);
    translate([20, 11, 4.0]) cube([1, 1, 8], center=true);
    translate([20, 12, 4.0]) cube([1, 1, 8], center=true);
    translate([20, 13, 4.0]) cube([1, 1, 8], center=true);
    translate([20, 14, 4.0]) cube([1, 1, 8], center=true);
    translate([20, 15, 4.0]) cube([1, 1, 8], center=true);
    translate([20, 16, 4.0]) cube([1, 1, 8], center=true);
    translate([20, 17, 4.0]) cube([1, 1, 8], center=true);
    translate([20, 18, 4.0]) cube([1, 1, 8], center=true);
    translate([20, 19, 4.0]) cube([1, 1, 8], center=true);
    translate([20, 20, 4.0]) cube([1, 1, 8], center=true);
    translate([20, 21, 4.0]) cube([1, 1, 8], center=true);
    translate([20, 22, 4.0]) cube([1, 1, 8], center=true);
    translate([20, 23, 4.0]) cube([1, 1, 8], center=true);
    translate([20, 24, 4.0]) cube([1, 1, 8], center=true);
    translate([21, 0, 4.0]) cube([1, 1, 8], center=true);
    translate([21, 1, 3.0]) cube([1, 1, 6], center=true);
    translate([21, 2, 3.0]) cube([1, 1, 6], center=true);
    translate([21, 3, 3.0]) cube([1, 1, 6], center=true);
    translate([21, 4, 3.0]) cube([1, 1, 6], center=true);
    translate([21, 5, 3.0]) cube([1, 1, 6], center=true);
    translate([21, 6, 1.5]) cube([1, 1, 3], center=true);
    translate([21, 7, 3.0]) cube([1, 1, 6], center=true);
    translate([21, 8, 3.0]) cube([1, 1, 6], center=true);
    translate([21, 9, 3.0]) cube([1, 1, 6], center=true);
    translate([21, 10, 3.0]) cube([1, 1, 6], center=true);
    translate([21, 11, 3.0]) cube([1, 1, 6], center=true);
    translate([21, 12, 3.0]) cube([1, 1, 6], center=true);
    translate([21, 13, 3.0]) cube([1, 1, 6], center=true);
    translate([21, 14, 3.0]) cube([1, 1, 6], center=true);
    translate([21, 15, 3.0]) cube([1, 1, 6], center=true);
    translate([21, 16, 3.0]) cube([1, 1, 6], center=true);
    translate([21, 17, 3.0]) cube([1, 1, 6], center=true);
    translate([21, 18, 1.5]) cube([1, 1, 3], center=true);
    translate([21, 19, 3.0]) cube([1, 1, 6], center=true);
    translate([21, 20, 3.0]) cube([1, 1, 6], center=true);
    translate([21, 21, 3.0]) cube([1, 1, 6], center=true);
    translate([21, 22, 3.0]) cube([1, 1, 6], center=true);
    translate([21, 23, 3.0]) cube([1, 1, 6], center=true);
    translate([21, 24, 4.0]) cube([1, 1, 8], center=true);
    translate([22, 0, 0.5]) cube([1, 1, 1], center=true);
    translate([22, 1, 0.5]) cube([1, 1, 1], center=true);
    translate([22, 2, 0.5]) cube([1, 1, 1], center=true);
    translate([22, 3, 0.5]) cube([1, 1, 1], center=true);
    translate([22, 4, 0.5]) cube([1, 1, 1], center=true);
    translate([22, 5, 0.5]) cube([1, 1, 1], center=true);
    translate([22, 6, 0.5]) cube([1, 1, 1], center=true);
    translate([22, 7, 0.5]) cube([1, 1, 1], center=true);
    translate([22, 8, 0.5]) cube([1, 1, 1], center=true);
    translate([22, 9, 0.5]) cube([1, 1, 1], center=true);
    translate([22, 10, 0.5]) cube([1, 1, 1], center=true);
    translate([22, 11, 0.5]) cube([1, 1, 1], center=true);
    translate([22, 12, 0.5]) cube([1, 1, 1], center=true);
    translate([22, 13, 0.5]) cube([1, 1, 1], center=true);
    translate([22, 14, 0.5]) cube([1, 1, 1], center=true);
    translate([22, 15, 0.5]) cube([1, 1, 1], center=true);
    translate([22, 16, 0.5]) cube([1, 1, 1], center=true);
    translate([22, 17, 0.5]) cube([1, 1, 1], center=true);
    translate([22, 18, 0.5]) cube([1, 1, 1], center=true);
    translate([22, 19, 0.5]) cube([1, 1, 1], center=true);
    translate([22, 20, 0.5]) cube([1, 1, 1], center=true);
    translate([22, 21, 0.5]) cube([1, 1, 1], center=true);
    translate([22, 22, 0.5]) cube([1, 1, 1], center=true);
    translate([22, 23, 2.5]) cube([1, 1, 5], center=true);
    translate([22, 24, 0.5]) cube([1, 1, 1], center=true);
    translate([23, 0, 4.0]) cube([1, 1, 8], center=true);
    translate([23, 1, 4.5]) color([0, 0, 1]) cube([1, 1, 1], center=true);
    translate([23, 2, 2.5]) cube([1, 1, 5], center=true);
    translate([23, 3, 2.5]) cube([1, 1, 5], center=true);
    translate([23, 4, 2.5]) cube([1, 1, 5], center=true);
    translate([23, 5, 2.5]) cube([1, 1, 5], center=true);
    translate([23, 6, 1.5]) cube([1, 1, 3], center=true);
    translate([23, 7, 2.5]) cube([1, 1, 5], center=true);
    translate([23, 8, 2.5]) cube([1, 1, 5], center=true);
    translate([23, 9, 2.5]) cube([1, 1, 5], center=true);
    translate([23, 10, 2.5]) cube([1, 1, 5], center=true);
    translate([23, 11, 2.5]) cube([1, 1, 5], center=true);
    translate([23, 12, 2.5]) cube([1, 1, 5], center=true);
    translate([23, 13, 2.5]) cube([1, 1, 5], center=true);
    translate([23, 14, 2.5]) cube([1, 1, 5], center=true);
    translate([23, 15, 2.5]) cube([1, 1, 5], center=true);
    translate([23, 16, 2.5]) cube([1, 1, 5], center=true);
    translate([23, 17, 2.5]) cube([1, 1, 5], center=true);
    translate([23, 18, 1.5]) cube([1, 1, 3], center=true);
    translate([23, 19, 2.5]) cube([1, 1, 5], center=true);
    translate([23, 20, 2.5]) cube([1, 1, 5], center=true);
    translate([23, 21, 2.5]) cube([1, 1, 5], center=true);
    translate([23, 22, 2.5]) cube([1, 1, 5], center=true);
    translate([23, 23, 2.5]) cube([1, 1, 5], center=true);
    translate([23, 24, 4.0]) cube([1, 1, 8], center=true);
    translate([24, 0, 4.0]) cube([1, 1, 8], center=true);
    translate([24, 1, 4.0]) cube([1, 1, 8], center=true);
    translate([24, 2, 4.0]) cube([1, 1, 8], center=true);
    translate([24, 3, 4.0]) cube([1, 1, 8], center=true);
    translate([24, 4, 4.0]) cube([1, 1, 8], center=true);
    translate([24, 5, 4.0]) cube([1, 1, 8], center=true);
    translate([24, 6, 4.0]) cube([1, 1, 8], center=true);
    translate([24, 7, 4.0]) cube([1, 1, 8], center=true);
    translate([24, 8, 4.0]) cube([1, 1, 8], center=true);
    translate([24, 9, 4.0]) cube([1, 1, 8], center=true);
    translate([24, 10, 4.0]) cube([1, 1, 8], center=true);
    translate([24, 11, 4.0]) cube([1, 1, 8], center=true);
    translate([24, 12, 4.0]) cube([1, 1, 8], center=true);
    translate([24, 13, 4.0]) cube([1, 1, 8], center=true);
    translate([24, 14, 4.0]) cube([1, 1, 8], center=true);
    translate([24, 15, 4.0]) cube([1, 1, 8], center=true);
    translate([24, 16, 4.0]) cube([1, 1, 8], center=true);
    translate([24, 17, 4.0]) cube([1, 1, 8], center=true);
    translate([24, 18, 4.0]) cube([1, 1, 8], center=true);
    translate([24, 19, 4.0]) cube([1, 1, 8], center=true);
    translate([24, 20, 4.0]) cube([1, 1, 8], center=true);
    translate([24, 21, 4.0]) cube([1, 1, 8], center=true);
    translate([24, 22, 4.0]) cube([1, 1, 8], center=true);
    translate([24, 23, 4.0]) cube([1, 1, 8], center=true);
    translate([24, 24, 4.0]) cube([1, 1, 8], center=true);
}
